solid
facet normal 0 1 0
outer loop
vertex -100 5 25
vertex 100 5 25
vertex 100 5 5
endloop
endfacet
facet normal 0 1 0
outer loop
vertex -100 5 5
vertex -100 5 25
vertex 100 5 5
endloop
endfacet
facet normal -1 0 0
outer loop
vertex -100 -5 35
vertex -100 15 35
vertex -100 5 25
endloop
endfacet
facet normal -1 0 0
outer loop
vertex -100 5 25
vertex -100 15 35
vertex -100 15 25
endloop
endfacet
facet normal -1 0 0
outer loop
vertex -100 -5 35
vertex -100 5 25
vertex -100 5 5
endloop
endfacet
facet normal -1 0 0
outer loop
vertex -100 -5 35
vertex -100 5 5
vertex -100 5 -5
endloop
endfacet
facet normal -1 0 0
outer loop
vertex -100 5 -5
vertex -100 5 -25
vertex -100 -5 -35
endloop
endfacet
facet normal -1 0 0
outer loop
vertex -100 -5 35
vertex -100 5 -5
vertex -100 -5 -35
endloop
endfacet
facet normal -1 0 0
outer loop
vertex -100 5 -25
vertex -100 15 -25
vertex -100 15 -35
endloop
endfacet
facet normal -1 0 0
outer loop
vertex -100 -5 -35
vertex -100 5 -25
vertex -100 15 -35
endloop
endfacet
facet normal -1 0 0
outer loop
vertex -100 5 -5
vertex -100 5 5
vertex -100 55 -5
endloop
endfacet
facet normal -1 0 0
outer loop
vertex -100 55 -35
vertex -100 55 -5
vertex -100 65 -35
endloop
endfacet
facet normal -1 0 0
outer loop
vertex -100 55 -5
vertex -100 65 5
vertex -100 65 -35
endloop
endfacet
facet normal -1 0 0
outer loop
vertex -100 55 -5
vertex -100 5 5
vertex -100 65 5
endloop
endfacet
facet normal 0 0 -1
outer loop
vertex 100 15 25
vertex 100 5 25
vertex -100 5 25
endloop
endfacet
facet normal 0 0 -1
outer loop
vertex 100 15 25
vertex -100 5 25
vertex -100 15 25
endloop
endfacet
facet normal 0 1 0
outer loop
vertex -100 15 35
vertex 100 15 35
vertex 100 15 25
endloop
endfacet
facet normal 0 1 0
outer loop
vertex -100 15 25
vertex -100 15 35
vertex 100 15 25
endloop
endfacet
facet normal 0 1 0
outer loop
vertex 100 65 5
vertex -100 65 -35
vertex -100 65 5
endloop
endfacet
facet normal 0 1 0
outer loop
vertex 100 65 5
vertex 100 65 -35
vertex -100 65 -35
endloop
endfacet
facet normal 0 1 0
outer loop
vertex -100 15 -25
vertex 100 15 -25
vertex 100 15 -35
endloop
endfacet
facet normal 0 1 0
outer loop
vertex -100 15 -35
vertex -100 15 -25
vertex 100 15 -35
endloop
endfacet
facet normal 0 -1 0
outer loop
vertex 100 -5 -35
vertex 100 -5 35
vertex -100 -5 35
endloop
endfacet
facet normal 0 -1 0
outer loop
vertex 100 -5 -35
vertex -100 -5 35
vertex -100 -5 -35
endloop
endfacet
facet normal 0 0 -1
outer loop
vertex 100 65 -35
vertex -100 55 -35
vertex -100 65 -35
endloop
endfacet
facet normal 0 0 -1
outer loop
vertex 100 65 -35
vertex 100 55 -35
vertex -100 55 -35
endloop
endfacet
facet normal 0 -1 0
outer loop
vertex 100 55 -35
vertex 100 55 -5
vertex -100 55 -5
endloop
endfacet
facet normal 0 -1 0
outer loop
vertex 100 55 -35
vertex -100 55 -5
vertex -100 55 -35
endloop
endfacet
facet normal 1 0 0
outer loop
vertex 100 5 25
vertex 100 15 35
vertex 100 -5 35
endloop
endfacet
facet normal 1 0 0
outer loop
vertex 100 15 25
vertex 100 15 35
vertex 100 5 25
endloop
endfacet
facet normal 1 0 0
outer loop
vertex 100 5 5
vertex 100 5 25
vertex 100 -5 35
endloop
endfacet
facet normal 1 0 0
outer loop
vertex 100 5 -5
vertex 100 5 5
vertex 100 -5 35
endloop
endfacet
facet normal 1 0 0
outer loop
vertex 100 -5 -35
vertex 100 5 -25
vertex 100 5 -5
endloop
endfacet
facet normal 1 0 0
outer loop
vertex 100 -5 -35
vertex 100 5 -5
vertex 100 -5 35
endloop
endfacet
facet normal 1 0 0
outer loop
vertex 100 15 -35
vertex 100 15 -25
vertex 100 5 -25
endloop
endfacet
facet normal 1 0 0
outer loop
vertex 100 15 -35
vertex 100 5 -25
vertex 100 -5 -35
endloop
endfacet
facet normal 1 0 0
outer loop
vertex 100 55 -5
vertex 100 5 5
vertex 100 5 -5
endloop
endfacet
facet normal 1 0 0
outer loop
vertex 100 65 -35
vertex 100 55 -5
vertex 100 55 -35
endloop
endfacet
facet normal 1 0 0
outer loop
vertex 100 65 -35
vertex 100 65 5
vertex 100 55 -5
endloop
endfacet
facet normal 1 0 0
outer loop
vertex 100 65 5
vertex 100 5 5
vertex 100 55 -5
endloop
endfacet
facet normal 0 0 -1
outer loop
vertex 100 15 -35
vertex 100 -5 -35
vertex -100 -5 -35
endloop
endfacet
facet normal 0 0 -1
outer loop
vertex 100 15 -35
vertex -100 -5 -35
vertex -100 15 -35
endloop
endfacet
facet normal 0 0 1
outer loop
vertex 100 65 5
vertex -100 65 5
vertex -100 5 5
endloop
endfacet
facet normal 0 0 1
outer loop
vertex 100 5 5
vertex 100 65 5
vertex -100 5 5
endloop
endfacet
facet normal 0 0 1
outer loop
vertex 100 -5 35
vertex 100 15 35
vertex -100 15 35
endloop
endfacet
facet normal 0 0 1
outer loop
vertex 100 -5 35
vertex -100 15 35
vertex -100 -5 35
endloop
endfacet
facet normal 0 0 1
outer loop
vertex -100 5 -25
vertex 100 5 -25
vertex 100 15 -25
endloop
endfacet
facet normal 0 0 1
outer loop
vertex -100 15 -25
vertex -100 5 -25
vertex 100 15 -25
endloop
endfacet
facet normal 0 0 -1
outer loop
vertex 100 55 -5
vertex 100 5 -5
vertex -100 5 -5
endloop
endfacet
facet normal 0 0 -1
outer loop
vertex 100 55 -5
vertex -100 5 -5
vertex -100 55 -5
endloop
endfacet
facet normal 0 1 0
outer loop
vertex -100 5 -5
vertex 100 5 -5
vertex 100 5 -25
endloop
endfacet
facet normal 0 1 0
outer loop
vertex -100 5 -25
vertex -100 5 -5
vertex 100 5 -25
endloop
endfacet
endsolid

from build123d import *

# Parameters (mm, degrees)
SKETCH_1_W      = 30
SKETCH_1_H      = 10
SKETCH_1_W_2    = 70
SKETCH_1_W_3    = 10
EXTRUDE_1_DEPTH = 100


with BuildPart() as part:
    # Эскиз1 → Бобышка-Вытянуть1 (new, symmetric)
    with BuildSketch(Plane(origin=(0, 0, 0), x_dir=(0, 0, -1), z_dir=(1, 0, 0))):
        Polygon((-5, 65), (-5, 5), (5, 5), (5, 55), (5, 65), align=None)
        with Locations((20, 60)):
            Rectangle(SKETCH_1_W, SKETCH_1_H)
        Rectangle(SKETCH_1_W_2, SKETCH_1_H)
        with Locations((30, 10)):
            Rectangle(SKETCH_1_W_3, SKETCH_1_H)
        with Locations((-30, 10)):
            Rectangle(SKETCH_1_W_3, SKETCH_1_H)
    extrude(amount=EXTRUDE_1_DEPTH, both=True)


solid = part.part
